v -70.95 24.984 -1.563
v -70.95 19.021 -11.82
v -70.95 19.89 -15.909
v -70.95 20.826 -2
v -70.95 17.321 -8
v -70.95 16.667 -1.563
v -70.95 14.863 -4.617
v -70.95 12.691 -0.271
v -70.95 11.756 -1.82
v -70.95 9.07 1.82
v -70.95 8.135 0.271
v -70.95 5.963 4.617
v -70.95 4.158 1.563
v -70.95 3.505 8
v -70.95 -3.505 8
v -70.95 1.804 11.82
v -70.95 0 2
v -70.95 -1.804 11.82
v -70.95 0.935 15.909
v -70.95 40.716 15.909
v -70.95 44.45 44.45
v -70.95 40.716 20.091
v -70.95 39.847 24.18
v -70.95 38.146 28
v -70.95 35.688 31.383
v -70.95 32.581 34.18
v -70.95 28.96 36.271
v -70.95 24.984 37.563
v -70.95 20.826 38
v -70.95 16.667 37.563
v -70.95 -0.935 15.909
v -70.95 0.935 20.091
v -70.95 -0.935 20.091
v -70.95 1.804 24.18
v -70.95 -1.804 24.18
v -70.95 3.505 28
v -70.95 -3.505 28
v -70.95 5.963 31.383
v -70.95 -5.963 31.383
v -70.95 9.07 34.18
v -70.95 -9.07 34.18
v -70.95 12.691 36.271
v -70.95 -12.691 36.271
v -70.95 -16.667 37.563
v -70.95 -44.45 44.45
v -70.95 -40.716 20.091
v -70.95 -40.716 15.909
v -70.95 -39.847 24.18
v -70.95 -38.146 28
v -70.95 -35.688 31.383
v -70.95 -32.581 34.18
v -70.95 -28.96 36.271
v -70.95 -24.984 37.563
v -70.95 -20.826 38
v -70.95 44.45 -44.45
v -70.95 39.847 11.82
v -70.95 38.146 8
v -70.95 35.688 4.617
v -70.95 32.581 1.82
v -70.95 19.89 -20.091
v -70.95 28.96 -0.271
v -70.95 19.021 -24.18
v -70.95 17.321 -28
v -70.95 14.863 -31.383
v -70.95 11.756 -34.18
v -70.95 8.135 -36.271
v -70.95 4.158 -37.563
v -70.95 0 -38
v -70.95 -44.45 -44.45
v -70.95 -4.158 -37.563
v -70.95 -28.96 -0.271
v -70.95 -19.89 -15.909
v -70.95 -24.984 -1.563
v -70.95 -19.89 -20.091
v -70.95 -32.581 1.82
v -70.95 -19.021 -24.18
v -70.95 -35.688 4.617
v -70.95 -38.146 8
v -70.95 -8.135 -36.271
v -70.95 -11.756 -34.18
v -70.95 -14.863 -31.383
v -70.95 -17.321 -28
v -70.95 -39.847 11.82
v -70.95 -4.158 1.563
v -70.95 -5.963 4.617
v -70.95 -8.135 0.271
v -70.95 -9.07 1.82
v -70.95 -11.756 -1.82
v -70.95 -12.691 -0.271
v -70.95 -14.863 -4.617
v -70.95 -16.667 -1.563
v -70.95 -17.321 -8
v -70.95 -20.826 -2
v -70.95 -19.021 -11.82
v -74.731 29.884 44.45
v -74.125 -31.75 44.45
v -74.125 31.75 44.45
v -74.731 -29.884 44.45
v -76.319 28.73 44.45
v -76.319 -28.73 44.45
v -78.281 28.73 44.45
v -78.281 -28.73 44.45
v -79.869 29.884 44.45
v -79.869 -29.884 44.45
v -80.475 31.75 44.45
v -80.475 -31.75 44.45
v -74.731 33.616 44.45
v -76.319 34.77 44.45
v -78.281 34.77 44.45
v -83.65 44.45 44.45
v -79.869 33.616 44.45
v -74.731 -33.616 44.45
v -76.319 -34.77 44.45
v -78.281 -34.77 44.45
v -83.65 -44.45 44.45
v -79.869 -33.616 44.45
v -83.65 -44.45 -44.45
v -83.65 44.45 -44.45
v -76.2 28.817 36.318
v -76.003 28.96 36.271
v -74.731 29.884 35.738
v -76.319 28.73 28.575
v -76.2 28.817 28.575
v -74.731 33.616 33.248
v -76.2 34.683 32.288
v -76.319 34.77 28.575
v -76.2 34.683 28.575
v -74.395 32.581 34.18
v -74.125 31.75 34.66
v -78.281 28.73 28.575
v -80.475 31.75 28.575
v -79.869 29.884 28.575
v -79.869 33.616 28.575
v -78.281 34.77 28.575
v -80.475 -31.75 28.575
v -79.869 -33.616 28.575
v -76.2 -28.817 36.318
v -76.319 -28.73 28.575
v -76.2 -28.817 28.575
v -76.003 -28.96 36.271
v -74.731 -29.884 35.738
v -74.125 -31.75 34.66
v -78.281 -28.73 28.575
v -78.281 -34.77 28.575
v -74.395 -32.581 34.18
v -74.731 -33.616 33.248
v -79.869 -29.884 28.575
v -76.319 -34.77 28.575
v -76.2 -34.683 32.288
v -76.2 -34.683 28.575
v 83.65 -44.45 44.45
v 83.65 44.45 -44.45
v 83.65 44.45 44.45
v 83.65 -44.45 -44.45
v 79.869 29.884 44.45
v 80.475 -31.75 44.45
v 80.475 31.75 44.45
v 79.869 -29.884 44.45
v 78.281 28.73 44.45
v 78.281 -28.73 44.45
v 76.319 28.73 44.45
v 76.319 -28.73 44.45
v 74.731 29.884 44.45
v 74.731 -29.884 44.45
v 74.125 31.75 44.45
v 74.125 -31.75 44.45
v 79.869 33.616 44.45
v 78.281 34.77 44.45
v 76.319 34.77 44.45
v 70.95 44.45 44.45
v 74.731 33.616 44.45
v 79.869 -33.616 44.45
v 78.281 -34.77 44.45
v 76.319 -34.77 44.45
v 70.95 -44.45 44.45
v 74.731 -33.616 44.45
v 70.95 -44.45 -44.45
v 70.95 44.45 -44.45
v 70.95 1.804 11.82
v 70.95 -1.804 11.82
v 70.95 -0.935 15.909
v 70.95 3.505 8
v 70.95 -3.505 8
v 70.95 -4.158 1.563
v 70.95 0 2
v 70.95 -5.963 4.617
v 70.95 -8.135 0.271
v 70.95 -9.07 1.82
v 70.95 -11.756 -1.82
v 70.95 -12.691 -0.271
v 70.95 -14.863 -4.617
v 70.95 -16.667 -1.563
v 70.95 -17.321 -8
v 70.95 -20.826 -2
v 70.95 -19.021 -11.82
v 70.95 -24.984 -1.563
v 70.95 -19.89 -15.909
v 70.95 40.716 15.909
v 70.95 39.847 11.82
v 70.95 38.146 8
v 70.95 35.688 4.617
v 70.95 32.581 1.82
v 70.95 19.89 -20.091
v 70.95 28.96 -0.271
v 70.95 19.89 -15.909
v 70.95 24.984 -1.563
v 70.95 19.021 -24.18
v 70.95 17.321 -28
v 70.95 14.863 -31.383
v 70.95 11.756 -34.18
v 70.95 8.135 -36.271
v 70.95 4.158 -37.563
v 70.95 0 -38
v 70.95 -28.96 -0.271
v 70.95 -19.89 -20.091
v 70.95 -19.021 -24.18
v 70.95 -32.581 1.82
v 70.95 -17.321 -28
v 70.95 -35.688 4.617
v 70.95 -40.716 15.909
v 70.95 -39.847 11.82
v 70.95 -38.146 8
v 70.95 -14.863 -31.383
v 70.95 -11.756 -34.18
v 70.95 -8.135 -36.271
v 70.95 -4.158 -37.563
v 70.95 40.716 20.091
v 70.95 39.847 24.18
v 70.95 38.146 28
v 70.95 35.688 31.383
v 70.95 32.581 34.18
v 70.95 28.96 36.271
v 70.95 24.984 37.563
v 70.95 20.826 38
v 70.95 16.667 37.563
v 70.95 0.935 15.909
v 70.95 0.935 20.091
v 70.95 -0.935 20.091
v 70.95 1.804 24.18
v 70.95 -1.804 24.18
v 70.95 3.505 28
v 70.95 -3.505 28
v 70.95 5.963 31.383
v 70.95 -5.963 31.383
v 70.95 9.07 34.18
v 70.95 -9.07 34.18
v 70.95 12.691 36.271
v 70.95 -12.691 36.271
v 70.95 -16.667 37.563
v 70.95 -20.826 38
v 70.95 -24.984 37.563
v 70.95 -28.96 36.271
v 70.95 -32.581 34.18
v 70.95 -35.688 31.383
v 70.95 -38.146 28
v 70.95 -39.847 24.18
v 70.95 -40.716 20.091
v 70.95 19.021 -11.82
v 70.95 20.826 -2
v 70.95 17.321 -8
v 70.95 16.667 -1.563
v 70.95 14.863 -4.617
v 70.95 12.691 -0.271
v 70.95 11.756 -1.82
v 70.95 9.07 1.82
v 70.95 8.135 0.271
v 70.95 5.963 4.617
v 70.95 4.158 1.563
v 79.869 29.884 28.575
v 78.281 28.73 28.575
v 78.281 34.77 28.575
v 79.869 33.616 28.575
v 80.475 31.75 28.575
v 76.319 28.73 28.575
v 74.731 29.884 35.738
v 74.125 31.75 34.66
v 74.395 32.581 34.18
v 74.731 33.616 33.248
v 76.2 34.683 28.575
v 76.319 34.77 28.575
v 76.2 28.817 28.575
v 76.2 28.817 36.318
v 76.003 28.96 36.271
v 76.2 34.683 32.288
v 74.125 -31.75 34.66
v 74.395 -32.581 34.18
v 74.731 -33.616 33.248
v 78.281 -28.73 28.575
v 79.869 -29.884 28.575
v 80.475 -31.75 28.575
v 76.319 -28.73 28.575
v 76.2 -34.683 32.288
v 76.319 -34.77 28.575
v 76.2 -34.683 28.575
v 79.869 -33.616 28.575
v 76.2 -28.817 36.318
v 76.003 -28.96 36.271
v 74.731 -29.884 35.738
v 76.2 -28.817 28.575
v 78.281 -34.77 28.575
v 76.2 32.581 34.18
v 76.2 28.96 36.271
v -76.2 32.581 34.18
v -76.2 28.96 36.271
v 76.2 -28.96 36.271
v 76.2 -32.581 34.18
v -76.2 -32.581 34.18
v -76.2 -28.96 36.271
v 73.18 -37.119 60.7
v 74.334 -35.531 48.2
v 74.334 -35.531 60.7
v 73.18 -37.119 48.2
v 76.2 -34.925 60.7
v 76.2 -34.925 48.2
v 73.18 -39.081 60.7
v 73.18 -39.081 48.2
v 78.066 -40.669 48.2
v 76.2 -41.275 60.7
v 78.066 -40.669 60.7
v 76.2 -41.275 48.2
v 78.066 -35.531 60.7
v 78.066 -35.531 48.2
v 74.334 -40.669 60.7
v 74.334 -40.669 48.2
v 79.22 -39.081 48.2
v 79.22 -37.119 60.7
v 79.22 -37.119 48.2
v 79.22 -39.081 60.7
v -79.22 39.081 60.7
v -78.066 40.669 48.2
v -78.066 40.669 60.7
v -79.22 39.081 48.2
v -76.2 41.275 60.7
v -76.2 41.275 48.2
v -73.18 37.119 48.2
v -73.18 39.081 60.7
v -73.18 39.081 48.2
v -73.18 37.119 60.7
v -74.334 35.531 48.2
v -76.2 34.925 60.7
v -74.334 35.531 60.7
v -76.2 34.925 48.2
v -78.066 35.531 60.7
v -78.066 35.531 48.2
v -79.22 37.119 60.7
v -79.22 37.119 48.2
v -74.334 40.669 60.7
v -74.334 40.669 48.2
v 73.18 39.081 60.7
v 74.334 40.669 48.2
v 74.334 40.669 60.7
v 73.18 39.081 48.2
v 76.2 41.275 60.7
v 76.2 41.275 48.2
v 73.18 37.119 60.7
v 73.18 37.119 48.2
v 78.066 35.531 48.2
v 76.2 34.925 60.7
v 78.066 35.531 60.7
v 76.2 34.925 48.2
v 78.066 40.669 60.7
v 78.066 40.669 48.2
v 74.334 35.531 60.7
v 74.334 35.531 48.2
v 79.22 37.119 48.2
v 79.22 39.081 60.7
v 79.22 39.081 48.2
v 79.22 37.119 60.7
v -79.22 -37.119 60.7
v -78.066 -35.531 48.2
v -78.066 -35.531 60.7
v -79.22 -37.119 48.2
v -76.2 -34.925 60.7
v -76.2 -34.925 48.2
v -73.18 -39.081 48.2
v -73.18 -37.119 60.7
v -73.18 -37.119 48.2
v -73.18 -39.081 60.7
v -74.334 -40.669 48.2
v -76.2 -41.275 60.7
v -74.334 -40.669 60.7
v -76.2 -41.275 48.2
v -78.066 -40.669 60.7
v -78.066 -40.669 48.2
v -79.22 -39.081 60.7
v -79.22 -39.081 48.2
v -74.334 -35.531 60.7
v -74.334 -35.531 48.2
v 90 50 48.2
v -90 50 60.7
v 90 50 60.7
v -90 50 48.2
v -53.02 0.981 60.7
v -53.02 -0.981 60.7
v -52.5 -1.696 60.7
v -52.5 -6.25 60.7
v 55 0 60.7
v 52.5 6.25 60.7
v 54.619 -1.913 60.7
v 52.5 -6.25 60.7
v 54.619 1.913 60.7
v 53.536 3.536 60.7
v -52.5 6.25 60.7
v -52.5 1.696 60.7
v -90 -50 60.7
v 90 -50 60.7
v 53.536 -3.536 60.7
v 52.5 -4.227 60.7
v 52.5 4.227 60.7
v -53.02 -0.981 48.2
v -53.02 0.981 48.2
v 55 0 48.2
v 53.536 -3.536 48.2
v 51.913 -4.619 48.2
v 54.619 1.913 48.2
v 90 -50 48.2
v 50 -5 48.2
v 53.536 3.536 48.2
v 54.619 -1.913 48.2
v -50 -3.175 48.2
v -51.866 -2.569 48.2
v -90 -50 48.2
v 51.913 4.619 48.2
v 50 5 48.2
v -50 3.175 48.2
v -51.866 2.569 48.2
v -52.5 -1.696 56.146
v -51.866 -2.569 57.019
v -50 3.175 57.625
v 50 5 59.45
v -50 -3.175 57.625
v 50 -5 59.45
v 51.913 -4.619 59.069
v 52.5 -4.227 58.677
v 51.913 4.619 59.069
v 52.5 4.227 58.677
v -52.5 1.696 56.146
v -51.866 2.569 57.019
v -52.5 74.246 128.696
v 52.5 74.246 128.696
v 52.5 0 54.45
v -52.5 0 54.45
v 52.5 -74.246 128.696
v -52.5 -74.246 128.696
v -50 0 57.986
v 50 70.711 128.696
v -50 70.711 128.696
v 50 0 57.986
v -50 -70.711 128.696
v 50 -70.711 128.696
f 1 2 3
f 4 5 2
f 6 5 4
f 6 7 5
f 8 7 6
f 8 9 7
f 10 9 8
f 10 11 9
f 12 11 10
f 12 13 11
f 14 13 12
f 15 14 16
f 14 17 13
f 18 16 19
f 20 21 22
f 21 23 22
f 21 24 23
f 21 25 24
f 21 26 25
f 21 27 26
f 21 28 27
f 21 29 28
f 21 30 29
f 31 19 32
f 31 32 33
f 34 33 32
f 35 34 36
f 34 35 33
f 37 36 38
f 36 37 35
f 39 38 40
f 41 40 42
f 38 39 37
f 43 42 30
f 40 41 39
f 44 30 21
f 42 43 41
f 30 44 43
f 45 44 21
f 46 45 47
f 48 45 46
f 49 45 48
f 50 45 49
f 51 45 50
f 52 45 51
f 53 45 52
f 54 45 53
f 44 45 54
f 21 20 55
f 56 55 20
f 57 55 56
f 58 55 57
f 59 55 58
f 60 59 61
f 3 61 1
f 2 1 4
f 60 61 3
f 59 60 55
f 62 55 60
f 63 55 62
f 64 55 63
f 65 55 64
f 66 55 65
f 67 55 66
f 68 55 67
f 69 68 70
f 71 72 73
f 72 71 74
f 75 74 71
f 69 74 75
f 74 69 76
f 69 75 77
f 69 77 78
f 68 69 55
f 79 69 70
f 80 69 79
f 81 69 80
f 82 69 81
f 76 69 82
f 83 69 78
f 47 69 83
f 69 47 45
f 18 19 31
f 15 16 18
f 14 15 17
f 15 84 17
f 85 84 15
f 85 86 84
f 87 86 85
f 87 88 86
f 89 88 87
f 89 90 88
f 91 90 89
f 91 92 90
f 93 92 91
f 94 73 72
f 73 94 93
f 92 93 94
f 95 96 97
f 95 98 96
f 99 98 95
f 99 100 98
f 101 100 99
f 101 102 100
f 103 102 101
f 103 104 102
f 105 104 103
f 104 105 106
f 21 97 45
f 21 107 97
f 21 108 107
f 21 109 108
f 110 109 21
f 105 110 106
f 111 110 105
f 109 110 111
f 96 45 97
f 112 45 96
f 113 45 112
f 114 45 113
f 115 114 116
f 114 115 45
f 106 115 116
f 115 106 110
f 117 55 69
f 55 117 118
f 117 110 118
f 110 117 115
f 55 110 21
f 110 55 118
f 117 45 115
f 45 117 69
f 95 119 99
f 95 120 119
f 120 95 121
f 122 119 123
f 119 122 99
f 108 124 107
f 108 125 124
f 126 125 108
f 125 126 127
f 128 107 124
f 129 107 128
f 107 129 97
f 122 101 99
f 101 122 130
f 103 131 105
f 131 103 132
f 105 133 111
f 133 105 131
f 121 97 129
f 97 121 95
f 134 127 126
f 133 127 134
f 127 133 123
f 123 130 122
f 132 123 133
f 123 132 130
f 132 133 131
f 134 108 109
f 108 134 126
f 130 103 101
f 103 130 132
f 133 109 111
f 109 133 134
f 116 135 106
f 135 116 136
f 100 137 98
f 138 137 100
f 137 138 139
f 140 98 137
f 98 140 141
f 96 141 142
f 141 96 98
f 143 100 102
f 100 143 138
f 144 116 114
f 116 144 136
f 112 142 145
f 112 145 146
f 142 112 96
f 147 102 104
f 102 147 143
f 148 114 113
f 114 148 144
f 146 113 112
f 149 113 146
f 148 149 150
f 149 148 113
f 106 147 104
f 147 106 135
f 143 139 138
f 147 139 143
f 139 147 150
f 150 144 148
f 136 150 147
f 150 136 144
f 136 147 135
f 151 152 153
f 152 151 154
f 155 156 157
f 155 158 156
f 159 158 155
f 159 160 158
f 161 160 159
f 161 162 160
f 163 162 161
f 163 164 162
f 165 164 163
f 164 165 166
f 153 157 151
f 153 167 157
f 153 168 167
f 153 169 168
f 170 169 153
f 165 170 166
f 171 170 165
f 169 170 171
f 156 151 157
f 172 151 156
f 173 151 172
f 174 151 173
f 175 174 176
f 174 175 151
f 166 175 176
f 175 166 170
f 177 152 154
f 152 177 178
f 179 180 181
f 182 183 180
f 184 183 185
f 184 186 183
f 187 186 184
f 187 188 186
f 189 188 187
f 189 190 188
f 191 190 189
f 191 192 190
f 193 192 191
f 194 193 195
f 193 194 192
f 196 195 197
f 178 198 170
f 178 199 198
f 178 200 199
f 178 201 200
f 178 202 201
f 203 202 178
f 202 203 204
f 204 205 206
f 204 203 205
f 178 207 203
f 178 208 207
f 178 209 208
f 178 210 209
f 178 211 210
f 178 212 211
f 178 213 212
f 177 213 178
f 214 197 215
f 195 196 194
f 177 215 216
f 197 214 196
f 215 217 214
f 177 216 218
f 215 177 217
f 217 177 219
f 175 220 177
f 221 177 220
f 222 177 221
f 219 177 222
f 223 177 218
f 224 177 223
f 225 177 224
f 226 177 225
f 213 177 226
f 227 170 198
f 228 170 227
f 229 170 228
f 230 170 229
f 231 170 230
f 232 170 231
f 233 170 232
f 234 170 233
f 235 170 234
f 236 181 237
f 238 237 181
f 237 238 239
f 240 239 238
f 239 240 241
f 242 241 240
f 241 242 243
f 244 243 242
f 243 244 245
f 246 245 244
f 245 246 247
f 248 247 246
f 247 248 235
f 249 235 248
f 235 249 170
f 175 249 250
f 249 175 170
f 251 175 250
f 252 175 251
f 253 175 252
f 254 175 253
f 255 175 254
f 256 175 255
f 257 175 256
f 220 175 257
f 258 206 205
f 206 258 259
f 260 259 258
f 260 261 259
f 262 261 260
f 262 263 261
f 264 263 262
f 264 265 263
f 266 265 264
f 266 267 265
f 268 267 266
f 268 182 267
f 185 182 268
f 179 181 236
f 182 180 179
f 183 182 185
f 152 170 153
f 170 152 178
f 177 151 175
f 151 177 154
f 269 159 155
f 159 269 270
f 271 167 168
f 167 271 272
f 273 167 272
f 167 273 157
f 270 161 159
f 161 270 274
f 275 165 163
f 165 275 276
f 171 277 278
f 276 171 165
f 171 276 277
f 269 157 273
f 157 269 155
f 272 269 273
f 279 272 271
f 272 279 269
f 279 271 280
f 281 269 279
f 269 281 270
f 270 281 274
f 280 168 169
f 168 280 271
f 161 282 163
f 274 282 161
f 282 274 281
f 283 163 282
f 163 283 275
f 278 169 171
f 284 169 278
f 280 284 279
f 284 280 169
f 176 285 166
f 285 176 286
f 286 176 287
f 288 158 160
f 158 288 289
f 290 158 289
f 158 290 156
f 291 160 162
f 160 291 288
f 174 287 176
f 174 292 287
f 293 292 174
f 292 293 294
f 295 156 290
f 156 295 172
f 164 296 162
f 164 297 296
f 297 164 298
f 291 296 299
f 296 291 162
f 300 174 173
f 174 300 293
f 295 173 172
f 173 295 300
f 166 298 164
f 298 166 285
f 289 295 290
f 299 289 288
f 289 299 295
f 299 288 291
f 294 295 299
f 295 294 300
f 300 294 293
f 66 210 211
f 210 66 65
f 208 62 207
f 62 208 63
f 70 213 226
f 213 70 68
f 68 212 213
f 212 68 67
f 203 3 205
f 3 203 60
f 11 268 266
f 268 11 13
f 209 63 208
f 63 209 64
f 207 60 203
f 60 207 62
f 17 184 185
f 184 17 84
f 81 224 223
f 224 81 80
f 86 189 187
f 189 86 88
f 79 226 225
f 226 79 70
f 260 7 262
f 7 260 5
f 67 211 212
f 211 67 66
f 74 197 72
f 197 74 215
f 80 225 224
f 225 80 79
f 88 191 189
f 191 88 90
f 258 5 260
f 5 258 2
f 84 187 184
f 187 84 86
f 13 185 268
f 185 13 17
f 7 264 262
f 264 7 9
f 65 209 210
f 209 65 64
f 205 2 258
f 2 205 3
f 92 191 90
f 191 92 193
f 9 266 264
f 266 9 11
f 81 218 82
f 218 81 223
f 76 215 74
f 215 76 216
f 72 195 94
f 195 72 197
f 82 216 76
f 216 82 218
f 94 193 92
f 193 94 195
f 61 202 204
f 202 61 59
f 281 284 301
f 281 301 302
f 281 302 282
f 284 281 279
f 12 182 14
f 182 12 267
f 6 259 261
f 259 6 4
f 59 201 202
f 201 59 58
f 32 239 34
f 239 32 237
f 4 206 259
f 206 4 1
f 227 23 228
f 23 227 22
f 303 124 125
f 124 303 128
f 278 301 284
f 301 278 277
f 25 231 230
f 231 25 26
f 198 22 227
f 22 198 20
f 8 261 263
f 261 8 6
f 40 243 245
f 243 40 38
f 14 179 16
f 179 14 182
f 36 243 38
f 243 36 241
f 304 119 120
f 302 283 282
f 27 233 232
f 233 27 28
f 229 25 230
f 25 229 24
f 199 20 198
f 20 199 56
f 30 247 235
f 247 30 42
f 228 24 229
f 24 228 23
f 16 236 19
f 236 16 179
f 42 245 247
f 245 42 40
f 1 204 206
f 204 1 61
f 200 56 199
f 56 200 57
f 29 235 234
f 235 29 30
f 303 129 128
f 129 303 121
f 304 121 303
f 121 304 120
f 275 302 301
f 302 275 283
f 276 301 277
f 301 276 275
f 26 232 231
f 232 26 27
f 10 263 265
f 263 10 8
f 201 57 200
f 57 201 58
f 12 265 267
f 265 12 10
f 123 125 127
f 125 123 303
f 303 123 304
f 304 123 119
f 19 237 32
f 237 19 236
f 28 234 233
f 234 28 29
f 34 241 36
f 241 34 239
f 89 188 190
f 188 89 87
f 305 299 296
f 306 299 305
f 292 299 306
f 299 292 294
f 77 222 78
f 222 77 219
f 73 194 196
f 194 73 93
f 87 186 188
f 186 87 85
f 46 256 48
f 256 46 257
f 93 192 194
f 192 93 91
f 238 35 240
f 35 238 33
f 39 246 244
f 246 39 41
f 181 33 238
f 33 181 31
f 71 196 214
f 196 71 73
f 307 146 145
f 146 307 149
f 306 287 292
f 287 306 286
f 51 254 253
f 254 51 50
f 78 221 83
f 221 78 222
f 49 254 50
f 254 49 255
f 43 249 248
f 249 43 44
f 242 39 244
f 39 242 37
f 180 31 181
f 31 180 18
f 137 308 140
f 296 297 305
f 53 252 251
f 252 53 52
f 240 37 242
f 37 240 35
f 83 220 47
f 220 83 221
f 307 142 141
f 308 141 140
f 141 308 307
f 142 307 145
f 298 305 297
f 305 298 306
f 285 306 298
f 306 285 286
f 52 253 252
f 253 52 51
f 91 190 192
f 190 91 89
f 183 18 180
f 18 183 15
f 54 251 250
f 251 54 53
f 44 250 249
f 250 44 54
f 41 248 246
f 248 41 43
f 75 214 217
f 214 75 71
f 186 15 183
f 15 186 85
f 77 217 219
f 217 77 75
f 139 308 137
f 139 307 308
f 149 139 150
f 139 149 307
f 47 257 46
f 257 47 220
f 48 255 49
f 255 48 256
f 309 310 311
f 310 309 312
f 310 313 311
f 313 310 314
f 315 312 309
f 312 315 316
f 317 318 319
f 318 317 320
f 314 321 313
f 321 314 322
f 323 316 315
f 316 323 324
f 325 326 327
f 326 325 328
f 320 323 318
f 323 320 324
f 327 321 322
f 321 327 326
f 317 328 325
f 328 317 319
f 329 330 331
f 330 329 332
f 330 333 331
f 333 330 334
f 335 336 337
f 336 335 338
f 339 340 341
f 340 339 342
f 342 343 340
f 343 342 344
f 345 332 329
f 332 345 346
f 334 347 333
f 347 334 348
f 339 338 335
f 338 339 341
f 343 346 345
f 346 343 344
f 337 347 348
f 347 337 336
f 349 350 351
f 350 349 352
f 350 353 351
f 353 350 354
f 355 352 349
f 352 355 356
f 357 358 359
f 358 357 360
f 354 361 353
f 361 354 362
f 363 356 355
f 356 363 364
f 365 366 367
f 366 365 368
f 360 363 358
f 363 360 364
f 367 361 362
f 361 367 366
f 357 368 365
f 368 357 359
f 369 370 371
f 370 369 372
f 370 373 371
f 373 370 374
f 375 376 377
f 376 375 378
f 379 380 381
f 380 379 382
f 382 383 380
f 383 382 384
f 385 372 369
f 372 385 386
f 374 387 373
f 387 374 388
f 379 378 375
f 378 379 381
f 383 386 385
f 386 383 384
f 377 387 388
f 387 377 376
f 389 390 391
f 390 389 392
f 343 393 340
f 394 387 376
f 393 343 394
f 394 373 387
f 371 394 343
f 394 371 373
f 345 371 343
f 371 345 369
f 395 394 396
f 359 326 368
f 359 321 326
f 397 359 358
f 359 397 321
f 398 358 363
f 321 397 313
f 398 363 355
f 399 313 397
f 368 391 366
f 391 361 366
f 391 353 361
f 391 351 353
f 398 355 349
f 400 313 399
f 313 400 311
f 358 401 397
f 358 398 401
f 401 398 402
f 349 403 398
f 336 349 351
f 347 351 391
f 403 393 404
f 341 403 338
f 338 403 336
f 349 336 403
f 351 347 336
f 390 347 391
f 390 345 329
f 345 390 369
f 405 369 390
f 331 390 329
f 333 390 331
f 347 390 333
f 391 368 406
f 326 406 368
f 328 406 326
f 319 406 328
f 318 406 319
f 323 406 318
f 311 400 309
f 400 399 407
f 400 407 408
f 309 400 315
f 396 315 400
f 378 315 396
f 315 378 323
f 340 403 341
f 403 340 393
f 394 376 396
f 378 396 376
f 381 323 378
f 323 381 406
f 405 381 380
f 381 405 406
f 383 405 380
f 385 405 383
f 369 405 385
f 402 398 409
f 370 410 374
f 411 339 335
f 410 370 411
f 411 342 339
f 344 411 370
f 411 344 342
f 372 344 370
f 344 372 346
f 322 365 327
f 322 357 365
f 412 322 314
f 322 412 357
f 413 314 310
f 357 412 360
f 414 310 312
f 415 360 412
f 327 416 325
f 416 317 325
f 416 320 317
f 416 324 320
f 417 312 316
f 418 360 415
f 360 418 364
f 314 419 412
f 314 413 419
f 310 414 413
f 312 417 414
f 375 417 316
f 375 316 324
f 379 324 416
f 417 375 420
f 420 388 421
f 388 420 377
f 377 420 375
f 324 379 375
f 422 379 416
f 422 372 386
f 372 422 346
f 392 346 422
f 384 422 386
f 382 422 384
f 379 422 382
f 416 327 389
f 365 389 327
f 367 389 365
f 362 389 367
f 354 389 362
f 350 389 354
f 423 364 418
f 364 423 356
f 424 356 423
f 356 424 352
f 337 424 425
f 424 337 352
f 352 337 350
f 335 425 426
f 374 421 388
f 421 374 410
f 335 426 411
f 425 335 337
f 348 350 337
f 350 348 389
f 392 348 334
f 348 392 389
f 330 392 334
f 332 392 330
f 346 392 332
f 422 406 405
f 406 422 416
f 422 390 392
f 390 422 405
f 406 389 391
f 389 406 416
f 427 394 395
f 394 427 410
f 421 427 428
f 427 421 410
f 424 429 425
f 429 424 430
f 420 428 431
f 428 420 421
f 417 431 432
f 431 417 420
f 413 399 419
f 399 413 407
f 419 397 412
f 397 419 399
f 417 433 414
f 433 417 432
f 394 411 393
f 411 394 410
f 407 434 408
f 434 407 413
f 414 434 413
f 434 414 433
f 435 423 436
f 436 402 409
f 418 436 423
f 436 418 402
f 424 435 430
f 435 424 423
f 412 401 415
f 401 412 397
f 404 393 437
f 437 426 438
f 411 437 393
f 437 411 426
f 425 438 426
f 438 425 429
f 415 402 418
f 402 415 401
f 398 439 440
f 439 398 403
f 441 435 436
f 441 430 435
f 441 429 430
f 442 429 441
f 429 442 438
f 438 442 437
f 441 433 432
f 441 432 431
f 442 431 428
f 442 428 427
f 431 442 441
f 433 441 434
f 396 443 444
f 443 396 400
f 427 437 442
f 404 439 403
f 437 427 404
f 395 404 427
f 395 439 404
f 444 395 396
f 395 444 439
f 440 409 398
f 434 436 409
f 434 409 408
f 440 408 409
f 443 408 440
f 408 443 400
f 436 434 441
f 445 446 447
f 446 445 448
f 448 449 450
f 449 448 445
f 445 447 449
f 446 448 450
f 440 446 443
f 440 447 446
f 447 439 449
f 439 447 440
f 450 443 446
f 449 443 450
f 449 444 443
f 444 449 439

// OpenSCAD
/*
Mill its self is 
7 + inch total lenght 177.8mm so 178mm
3.5 inch with 88.9mm
3.5 inch hight 88.9mm
sides .5 inch thick  12.7mm
holes are centered acrost the end and inset 3/4 inch 19.05mm
1/4 inch holes(guess) 6.35mm
TODO: Like to get rid of rodate and standareize xyz and name xyz at top like X= len y=with Z= hight etc 
*/
//Mill Dims
    MillX= 180;//7 + inch total lenght 177.8mm so 178mm
    MillZ=88.9; //3.5inch
    MillY=88.9; //3.5inch
    MillSideXThickness=12.7;//.5 inch 
    RollerX=152.4;// 6 inch
    RollerRad=20;// total guess
    MillHoleInset=12.7;
    MillHoleDepth=31.75;

// hooper Dims
    boltsLenth=152.4;  //6 inch
    boltswidth=76.2; //3 inch guess
    totalLenth=180; // guess
    totalWidth=100; // guess

    baseThickness=12.5;// as needed

    BoltHoleLenth=baseThickness+3;
    BoltHoleRad=3.175;
    BoltOffSetL=(totalLenth-boltsLenth)/2;
    BoltOffSetW=(totalWidth-boltswidth)/2;
    slotRad=5;
    slotL=100;
    hopperThickness=5;

module Base_old() {
    // bolts to the mill 
    // may hold plexy sides 
    // shoud hold funnel
 
    translate([totalWidth/-2, totalLenth/-2, baseThickness/-2])
        difference(){
        cube ([totalWidth,totalLenth,baseThickness] );
        translate([0, 0, -.5])      
            ScrewHoles();
        translate([totalWidth/2,(totalLenth-slotL)/2 , -.5])    
            BaseSlot();
        }
}
module Base() {
    // bolts to the mill 
    // may hold plexy sides 
    // shoud hold funnel
        difference(){
        cube ([totalWidth,totalLenth,baseThickness],center=true );
        translate([0, 0, -.5])      
            ScrewHoles();
        translate([totalWidth/2,(totalLenth-slotL)/2 , -.5])    
            BaseSlot();
        }
}

module ScrewHoles() {
    // bolts to the mill 
    // may hold plexy sides 
    // shoud hold funnel
 
  translate([BoltOffSetW,BoltOffSetL,0])   cylinder(r=BoltHoleRad, h=BoltHoleLenth);
  translate([BoltOffSetW+boltswidth,BoltOffSetL+boltsLenth,0])  cylinder(r=BoltHoleRad, h=BoltHoleLenth);
 translate([BoltOffSetW+boltswidth,BoltOffSetL,0])   cylinder(r=BoltHoleRad, h=BoltHoleLenth);
  translate([BoltOffSetW,BoltOffSetL+boltsLenth,0])  cylinder(r=BoltHoleRad, h=BoltHoleLenth);
}
module BaseSlot() {

    hull(){
    cylinder(r=slotRad, h=BoltHoleLenth);
    translate([0,slotL,0])  cylinder(r=BoltHoleRad, h=BoltHoleLenth);
    }    
     
 }

module hopper(args) {
    // rotate([0,45,0 ]) {
        hyop= sqrt(pow(slotL+hopperThickness,2) *2);
        echo(str("hyop = ", hyop));
        translate([0,0,hyop/2])
       difference(){
          rotate([0,45,0 ])  cube ([slotL+hopperThickness,slotL+hopperThickness,slotL+hopperThickness],center=true );
           rotate([0,45,0 ])  cube ([slotL,slotL,slotL] ,center=true);
           //cut top off
           translate([0,0,slotL/2])       cube ([slotL*2,slotL*1.5,slotL] ,center=true);
         
             }
        
 }

module MillSide() {
      difference(){
            cube([MillSideXThickness,MillY,MillZ],center=true);
         translate([0, MillY/2-MillHoleInset,MillZ/2])
             cylinder(r=BoltHoleRad, h=MillHoleDepth, center=true);
          translate([0, MillY/-2+MillHoleInset,MillZ/2])
             cylinder(r=BoltHoleRad, h=MillHoleDepth, center=true);
      }
 }

module Mill() {
    rollerZOffset=18;
    rollerGap=1.651;//0.065" from web site
    rolleryOffset=RollerRad+rollerGap/2;
    
   translate([(MillX-MillSideXThickness*2)/-2,0,0 ]) MillSide();
      translate([(MillX-MillSideXThickness*2)/2,0,0 ]) MillSide();
    //rollers
    translate([0, 0,-rollerZOffset]) 
     rotate([0, 90, 0])      
     cylinder(r=RollerRad, h=RollerX, center=true);
      translate([0,rolleryOffset,rollerZOffset]) 
     rotate([0, 90, 0])      
     cylinder(r=RollerRad, h=RollerX, center=true);
     translate([0,-rolleryOffset,rollerZOffset]) 
     rotate([0, 90, 0])      
     cylinder(r=RollerRad, h=RollerX, center=true);
} 
Mill();

translate([0,0,MillZ/2+10])

 rotate([0,0,90])
{
    Base_old();
//this trans nees some work.
 //translate([totalWidth/2,(totalLenth/2) , -.5]) 
          hopper();
}
